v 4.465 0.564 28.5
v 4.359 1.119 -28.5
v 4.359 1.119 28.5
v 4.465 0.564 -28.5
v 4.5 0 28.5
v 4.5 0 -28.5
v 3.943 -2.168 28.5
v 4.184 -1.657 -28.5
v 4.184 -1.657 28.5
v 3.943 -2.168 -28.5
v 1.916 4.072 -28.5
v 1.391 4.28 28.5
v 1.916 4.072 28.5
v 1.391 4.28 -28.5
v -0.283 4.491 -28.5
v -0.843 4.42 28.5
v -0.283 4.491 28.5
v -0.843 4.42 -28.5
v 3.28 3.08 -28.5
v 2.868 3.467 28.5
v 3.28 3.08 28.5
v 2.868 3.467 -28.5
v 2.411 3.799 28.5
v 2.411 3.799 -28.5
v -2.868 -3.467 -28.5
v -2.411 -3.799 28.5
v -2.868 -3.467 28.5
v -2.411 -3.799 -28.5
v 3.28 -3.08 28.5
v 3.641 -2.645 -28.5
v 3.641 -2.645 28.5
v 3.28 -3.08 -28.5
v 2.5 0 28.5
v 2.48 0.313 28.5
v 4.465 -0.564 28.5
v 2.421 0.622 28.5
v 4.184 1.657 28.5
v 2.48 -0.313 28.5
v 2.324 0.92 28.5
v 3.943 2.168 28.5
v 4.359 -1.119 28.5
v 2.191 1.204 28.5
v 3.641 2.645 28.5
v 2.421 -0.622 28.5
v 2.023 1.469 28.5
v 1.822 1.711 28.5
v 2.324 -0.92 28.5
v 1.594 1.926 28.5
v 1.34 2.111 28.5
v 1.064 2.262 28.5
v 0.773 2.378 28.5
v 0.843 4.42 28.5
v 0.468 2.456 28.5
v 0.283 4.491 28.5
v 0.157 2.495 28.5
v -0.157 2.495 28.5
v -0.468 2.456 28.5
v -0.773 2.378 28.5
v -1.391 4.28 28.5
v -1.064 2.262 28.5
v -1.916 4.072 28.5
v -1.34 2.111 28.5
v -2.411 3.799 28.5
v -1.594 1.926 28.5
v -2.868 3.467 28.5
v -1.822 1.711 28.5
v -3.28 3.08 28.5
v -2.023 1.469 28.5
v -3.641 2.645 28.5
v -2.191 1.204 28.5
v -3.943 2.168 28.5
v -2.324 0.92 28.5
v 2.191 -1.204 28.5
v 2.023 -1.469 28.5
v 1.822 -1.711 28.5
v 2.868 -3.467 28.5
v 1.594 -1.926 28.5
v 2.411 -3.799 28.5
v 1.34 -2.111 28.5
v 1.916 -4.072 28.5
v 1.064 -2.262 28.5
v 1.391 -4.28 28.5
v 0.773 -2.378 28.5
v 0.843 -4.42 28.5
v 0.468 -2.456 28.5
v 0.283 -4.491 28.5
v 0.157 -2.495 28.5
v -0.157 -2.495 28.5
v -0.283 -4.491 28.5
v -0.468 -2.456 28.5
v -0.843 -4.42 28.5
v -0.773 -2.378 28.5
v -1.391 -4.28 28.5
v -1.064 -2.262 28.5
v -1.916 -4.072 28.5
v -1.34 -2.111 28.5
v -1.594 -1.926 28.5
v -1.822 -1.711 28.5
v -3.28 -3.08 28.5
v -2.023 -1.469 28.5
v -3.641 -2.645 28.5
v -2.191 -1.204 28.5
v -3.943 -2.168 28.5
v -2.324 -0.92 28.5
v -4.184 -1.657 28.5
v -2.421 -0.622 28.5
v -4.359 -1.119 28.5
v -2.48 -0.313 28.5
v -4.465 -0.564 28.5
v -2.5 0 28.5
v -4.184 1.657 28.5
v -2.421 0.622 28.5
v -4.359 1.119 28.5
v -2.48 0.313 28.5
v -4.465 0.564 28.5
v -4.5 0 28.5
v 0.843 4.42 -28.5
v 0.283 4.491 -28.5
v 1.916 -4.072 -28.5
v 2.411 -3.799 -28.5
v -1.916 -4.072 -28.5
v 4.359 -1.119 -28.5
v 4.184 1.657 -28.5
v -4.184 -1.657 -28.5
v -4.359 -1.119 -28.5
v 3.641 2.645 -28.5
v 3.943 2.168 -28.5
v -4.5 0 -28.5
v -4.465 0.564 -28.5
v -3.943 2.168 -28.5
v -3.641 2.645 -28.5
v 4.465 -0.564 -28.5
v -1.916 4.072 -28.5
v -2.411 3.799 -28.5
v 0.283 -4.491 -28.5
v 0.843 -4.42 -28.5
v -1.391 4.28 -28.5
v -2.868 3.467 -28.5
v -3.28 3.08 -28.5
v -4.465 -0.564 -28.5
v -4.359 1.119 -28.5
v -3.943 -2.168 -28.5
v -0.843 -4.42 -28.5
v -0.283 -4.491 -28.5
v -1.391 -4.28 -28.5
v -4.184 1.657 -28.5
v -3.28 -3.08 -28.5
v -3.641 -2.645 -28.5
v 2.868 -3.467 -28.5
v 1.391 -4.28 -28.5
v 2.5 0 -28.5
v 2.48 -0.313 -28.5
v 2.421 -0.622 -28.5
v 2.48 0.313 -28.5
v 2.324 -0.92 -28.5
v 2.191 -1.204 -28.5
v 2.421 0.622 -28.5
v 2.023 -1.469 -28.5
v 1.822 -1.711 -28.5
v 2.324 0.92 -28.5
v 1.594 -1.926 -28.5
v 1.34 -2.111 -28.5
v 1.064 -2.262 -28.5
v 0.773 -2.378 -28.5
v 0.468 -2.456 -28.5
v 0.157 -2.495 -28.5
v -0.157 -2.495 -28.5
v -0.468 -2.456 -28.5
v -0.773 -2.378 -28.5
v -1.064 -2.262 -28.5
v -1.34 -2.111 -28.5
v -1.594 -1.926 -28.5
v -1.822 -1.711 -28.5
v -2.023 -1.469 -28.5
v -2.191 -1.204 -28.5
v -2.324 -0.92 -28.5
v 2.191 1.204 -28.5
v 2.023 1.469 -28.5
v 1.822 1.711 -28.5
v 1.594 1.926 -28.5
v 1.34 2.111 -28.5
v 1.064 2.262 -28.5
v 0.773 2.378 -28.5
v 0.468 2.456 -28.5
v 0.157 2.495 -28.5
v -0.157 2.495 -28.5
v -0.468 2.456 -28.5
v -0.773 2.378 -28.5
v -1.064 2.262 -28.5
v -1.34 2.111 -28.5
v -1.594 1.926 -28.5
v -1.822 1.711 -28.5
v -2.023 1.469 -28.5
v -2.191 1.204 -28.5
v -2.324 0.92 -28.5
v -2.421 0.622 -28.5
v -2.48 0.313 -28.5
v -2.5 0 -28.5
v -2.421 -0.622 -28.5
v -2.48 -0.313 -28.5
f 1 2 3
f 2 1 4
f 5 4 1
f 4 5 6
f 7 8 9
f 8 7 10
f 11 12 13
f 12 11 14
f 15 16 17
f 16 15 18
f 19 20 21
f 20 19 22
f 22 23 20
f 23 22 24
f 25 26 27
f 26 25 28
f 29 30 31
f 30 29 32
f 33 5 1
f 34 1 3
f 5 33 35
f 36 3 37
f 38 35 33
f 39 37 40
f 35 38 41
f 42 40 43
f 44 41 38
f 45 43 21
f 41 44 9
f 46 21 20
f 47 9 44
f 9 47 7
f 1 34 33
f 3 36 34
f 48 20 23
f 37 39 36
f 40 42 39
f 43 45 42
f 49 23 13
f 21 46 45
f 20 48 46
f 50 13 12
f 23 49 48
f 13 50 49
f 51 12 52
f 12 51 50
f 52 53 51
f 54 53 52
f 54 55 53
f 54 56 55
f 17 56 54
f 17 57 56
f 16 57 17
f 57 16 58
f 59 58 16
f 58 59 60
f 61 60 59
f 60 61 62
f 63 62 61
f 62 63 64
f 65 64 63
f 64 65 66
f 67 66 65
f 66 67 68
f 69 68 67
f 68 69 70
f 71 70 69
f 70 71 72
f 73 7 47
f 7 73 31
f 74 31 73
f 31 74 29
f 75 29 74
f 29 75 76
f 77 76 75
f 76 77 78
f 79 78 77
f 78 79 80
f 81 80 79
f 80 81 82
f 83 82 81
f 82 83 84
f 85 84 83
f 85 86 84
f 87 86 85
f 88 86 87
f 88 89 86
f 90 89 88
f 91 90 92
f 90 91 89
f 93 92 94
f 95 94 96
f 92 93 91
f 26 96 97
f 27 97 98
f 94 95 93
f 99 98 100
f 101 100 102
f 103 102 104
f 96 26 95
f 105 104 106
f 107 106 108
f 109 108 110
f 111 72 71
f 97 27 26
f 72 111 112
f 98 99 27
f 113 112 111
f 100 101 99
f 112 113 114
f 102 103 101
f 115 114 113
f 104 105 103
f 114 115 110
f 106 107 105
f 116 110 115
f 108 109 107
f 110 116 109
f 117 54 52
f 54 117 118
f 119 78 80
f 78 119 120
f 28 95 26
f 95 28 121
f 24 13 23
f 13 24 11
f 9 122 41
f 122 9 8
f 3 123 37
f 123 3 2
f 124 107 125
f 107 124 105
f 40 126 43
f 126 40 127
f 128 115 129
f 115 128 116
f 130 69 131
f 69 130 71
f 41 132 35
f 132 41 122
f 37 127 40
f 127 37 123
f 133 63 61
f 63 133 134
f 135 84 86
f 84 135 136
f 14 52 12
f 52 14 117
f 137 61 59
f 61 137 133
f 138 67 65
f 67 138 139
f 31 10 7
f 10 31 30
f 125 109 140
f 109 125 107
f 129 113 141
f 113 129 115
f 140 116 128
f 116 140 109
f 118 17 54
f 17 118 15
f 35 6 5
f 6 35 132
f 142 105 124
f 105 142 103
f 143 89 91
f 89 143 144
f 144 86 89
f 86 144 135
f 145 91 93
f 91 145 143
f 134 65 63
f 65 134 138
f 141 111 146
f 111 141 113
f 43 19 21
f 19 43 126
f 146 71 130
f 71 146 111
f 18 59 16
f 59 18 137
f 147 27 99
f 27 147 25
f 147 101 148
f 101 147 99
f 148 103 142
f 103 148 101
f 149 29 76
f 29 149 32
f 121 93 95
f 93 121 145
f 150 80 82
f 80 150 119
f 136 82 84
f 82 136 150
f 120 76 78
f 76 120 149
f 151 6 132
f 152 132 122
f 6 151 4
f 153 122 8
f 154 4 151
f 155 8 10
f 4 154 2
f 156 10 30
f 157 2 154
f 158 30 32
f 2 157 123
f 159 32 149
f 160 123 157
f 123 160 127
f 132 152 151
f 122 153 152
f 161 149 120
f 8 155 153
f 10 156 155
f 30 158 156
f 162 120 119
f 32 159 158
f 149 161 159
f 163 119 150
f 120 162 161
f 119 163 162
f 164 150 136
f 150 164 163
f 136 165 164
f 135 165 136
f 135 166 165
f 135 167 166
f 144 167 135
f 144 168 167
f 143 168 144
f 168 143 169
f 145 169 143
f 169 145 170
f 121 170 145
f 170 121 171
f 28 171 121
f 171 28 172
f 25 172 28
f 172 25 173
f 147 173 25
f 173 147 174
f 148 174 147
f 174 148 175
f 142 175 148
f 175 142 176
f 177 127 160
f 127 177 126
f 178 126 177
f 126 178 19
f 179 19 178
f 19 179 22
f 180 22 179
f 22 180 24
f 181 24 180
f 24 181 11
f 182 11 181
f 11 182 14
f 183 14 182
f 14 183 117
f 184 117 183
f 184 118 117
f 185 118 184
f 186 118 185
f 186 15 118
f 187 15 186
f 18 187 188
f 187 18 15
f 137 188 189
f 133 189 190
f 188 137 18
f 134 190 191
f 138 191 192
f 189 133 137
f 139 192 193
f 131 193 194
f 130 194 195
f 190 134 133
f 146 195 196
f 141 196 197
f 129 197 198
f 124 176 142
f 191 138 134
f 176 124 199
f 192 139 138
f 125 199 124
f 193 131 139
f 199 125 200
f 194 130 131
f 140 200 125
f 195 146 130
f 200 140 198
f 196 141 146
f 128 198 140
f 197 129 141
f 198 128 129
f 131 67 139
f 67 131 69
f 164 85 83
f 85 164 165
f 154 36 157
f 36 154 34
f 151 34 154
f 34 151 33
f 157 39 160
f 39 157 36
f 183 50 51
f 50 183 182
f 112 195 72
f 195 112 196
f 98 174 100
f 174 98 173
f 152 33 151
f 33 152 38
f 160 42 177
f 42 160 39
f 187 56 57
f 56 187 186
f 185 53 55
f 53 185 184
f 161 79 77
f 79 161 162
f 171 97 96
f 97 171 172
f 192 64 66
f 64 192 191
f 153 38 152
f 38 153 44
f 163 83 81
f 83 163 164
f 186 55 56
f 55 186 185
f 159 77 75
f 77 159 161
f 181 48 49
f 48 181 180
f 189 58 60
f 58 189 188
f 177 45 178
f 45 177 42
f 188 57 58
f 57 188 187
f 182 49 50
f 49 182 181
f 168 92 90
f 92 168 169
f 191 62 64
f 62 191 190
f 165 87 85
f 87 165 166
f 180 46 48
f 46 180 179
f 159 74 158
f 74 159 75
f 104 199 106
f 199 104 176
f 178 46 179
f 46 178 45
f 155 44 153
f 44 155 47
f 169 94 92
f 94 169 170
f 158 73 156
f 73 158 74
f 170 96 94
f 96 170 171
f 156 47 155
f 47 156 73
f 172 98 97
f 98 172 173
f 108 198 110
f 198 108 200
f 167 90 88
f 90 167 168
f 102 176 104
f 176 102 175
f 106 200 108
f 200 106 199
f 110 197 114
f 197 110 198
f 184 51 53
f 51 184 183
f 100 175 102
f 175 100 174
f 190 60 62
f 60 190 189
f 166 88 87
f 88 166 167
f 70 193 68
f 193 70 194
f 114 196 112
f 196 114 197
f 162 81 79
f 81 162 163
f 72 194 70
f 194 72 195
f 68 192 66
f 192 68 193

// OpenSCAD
$fn = 50;


difference() {
	union() {
		translate(v = [0, 0, -28.5000000000]) {
			cylinder(h = 57, r = 4.5000000000);
		}
	}
	union() {
		translate(v = [0, 0, -100.0000000000]) {
			cylinder(h = 200, r = 2.5000000000);
		}
	}
}
